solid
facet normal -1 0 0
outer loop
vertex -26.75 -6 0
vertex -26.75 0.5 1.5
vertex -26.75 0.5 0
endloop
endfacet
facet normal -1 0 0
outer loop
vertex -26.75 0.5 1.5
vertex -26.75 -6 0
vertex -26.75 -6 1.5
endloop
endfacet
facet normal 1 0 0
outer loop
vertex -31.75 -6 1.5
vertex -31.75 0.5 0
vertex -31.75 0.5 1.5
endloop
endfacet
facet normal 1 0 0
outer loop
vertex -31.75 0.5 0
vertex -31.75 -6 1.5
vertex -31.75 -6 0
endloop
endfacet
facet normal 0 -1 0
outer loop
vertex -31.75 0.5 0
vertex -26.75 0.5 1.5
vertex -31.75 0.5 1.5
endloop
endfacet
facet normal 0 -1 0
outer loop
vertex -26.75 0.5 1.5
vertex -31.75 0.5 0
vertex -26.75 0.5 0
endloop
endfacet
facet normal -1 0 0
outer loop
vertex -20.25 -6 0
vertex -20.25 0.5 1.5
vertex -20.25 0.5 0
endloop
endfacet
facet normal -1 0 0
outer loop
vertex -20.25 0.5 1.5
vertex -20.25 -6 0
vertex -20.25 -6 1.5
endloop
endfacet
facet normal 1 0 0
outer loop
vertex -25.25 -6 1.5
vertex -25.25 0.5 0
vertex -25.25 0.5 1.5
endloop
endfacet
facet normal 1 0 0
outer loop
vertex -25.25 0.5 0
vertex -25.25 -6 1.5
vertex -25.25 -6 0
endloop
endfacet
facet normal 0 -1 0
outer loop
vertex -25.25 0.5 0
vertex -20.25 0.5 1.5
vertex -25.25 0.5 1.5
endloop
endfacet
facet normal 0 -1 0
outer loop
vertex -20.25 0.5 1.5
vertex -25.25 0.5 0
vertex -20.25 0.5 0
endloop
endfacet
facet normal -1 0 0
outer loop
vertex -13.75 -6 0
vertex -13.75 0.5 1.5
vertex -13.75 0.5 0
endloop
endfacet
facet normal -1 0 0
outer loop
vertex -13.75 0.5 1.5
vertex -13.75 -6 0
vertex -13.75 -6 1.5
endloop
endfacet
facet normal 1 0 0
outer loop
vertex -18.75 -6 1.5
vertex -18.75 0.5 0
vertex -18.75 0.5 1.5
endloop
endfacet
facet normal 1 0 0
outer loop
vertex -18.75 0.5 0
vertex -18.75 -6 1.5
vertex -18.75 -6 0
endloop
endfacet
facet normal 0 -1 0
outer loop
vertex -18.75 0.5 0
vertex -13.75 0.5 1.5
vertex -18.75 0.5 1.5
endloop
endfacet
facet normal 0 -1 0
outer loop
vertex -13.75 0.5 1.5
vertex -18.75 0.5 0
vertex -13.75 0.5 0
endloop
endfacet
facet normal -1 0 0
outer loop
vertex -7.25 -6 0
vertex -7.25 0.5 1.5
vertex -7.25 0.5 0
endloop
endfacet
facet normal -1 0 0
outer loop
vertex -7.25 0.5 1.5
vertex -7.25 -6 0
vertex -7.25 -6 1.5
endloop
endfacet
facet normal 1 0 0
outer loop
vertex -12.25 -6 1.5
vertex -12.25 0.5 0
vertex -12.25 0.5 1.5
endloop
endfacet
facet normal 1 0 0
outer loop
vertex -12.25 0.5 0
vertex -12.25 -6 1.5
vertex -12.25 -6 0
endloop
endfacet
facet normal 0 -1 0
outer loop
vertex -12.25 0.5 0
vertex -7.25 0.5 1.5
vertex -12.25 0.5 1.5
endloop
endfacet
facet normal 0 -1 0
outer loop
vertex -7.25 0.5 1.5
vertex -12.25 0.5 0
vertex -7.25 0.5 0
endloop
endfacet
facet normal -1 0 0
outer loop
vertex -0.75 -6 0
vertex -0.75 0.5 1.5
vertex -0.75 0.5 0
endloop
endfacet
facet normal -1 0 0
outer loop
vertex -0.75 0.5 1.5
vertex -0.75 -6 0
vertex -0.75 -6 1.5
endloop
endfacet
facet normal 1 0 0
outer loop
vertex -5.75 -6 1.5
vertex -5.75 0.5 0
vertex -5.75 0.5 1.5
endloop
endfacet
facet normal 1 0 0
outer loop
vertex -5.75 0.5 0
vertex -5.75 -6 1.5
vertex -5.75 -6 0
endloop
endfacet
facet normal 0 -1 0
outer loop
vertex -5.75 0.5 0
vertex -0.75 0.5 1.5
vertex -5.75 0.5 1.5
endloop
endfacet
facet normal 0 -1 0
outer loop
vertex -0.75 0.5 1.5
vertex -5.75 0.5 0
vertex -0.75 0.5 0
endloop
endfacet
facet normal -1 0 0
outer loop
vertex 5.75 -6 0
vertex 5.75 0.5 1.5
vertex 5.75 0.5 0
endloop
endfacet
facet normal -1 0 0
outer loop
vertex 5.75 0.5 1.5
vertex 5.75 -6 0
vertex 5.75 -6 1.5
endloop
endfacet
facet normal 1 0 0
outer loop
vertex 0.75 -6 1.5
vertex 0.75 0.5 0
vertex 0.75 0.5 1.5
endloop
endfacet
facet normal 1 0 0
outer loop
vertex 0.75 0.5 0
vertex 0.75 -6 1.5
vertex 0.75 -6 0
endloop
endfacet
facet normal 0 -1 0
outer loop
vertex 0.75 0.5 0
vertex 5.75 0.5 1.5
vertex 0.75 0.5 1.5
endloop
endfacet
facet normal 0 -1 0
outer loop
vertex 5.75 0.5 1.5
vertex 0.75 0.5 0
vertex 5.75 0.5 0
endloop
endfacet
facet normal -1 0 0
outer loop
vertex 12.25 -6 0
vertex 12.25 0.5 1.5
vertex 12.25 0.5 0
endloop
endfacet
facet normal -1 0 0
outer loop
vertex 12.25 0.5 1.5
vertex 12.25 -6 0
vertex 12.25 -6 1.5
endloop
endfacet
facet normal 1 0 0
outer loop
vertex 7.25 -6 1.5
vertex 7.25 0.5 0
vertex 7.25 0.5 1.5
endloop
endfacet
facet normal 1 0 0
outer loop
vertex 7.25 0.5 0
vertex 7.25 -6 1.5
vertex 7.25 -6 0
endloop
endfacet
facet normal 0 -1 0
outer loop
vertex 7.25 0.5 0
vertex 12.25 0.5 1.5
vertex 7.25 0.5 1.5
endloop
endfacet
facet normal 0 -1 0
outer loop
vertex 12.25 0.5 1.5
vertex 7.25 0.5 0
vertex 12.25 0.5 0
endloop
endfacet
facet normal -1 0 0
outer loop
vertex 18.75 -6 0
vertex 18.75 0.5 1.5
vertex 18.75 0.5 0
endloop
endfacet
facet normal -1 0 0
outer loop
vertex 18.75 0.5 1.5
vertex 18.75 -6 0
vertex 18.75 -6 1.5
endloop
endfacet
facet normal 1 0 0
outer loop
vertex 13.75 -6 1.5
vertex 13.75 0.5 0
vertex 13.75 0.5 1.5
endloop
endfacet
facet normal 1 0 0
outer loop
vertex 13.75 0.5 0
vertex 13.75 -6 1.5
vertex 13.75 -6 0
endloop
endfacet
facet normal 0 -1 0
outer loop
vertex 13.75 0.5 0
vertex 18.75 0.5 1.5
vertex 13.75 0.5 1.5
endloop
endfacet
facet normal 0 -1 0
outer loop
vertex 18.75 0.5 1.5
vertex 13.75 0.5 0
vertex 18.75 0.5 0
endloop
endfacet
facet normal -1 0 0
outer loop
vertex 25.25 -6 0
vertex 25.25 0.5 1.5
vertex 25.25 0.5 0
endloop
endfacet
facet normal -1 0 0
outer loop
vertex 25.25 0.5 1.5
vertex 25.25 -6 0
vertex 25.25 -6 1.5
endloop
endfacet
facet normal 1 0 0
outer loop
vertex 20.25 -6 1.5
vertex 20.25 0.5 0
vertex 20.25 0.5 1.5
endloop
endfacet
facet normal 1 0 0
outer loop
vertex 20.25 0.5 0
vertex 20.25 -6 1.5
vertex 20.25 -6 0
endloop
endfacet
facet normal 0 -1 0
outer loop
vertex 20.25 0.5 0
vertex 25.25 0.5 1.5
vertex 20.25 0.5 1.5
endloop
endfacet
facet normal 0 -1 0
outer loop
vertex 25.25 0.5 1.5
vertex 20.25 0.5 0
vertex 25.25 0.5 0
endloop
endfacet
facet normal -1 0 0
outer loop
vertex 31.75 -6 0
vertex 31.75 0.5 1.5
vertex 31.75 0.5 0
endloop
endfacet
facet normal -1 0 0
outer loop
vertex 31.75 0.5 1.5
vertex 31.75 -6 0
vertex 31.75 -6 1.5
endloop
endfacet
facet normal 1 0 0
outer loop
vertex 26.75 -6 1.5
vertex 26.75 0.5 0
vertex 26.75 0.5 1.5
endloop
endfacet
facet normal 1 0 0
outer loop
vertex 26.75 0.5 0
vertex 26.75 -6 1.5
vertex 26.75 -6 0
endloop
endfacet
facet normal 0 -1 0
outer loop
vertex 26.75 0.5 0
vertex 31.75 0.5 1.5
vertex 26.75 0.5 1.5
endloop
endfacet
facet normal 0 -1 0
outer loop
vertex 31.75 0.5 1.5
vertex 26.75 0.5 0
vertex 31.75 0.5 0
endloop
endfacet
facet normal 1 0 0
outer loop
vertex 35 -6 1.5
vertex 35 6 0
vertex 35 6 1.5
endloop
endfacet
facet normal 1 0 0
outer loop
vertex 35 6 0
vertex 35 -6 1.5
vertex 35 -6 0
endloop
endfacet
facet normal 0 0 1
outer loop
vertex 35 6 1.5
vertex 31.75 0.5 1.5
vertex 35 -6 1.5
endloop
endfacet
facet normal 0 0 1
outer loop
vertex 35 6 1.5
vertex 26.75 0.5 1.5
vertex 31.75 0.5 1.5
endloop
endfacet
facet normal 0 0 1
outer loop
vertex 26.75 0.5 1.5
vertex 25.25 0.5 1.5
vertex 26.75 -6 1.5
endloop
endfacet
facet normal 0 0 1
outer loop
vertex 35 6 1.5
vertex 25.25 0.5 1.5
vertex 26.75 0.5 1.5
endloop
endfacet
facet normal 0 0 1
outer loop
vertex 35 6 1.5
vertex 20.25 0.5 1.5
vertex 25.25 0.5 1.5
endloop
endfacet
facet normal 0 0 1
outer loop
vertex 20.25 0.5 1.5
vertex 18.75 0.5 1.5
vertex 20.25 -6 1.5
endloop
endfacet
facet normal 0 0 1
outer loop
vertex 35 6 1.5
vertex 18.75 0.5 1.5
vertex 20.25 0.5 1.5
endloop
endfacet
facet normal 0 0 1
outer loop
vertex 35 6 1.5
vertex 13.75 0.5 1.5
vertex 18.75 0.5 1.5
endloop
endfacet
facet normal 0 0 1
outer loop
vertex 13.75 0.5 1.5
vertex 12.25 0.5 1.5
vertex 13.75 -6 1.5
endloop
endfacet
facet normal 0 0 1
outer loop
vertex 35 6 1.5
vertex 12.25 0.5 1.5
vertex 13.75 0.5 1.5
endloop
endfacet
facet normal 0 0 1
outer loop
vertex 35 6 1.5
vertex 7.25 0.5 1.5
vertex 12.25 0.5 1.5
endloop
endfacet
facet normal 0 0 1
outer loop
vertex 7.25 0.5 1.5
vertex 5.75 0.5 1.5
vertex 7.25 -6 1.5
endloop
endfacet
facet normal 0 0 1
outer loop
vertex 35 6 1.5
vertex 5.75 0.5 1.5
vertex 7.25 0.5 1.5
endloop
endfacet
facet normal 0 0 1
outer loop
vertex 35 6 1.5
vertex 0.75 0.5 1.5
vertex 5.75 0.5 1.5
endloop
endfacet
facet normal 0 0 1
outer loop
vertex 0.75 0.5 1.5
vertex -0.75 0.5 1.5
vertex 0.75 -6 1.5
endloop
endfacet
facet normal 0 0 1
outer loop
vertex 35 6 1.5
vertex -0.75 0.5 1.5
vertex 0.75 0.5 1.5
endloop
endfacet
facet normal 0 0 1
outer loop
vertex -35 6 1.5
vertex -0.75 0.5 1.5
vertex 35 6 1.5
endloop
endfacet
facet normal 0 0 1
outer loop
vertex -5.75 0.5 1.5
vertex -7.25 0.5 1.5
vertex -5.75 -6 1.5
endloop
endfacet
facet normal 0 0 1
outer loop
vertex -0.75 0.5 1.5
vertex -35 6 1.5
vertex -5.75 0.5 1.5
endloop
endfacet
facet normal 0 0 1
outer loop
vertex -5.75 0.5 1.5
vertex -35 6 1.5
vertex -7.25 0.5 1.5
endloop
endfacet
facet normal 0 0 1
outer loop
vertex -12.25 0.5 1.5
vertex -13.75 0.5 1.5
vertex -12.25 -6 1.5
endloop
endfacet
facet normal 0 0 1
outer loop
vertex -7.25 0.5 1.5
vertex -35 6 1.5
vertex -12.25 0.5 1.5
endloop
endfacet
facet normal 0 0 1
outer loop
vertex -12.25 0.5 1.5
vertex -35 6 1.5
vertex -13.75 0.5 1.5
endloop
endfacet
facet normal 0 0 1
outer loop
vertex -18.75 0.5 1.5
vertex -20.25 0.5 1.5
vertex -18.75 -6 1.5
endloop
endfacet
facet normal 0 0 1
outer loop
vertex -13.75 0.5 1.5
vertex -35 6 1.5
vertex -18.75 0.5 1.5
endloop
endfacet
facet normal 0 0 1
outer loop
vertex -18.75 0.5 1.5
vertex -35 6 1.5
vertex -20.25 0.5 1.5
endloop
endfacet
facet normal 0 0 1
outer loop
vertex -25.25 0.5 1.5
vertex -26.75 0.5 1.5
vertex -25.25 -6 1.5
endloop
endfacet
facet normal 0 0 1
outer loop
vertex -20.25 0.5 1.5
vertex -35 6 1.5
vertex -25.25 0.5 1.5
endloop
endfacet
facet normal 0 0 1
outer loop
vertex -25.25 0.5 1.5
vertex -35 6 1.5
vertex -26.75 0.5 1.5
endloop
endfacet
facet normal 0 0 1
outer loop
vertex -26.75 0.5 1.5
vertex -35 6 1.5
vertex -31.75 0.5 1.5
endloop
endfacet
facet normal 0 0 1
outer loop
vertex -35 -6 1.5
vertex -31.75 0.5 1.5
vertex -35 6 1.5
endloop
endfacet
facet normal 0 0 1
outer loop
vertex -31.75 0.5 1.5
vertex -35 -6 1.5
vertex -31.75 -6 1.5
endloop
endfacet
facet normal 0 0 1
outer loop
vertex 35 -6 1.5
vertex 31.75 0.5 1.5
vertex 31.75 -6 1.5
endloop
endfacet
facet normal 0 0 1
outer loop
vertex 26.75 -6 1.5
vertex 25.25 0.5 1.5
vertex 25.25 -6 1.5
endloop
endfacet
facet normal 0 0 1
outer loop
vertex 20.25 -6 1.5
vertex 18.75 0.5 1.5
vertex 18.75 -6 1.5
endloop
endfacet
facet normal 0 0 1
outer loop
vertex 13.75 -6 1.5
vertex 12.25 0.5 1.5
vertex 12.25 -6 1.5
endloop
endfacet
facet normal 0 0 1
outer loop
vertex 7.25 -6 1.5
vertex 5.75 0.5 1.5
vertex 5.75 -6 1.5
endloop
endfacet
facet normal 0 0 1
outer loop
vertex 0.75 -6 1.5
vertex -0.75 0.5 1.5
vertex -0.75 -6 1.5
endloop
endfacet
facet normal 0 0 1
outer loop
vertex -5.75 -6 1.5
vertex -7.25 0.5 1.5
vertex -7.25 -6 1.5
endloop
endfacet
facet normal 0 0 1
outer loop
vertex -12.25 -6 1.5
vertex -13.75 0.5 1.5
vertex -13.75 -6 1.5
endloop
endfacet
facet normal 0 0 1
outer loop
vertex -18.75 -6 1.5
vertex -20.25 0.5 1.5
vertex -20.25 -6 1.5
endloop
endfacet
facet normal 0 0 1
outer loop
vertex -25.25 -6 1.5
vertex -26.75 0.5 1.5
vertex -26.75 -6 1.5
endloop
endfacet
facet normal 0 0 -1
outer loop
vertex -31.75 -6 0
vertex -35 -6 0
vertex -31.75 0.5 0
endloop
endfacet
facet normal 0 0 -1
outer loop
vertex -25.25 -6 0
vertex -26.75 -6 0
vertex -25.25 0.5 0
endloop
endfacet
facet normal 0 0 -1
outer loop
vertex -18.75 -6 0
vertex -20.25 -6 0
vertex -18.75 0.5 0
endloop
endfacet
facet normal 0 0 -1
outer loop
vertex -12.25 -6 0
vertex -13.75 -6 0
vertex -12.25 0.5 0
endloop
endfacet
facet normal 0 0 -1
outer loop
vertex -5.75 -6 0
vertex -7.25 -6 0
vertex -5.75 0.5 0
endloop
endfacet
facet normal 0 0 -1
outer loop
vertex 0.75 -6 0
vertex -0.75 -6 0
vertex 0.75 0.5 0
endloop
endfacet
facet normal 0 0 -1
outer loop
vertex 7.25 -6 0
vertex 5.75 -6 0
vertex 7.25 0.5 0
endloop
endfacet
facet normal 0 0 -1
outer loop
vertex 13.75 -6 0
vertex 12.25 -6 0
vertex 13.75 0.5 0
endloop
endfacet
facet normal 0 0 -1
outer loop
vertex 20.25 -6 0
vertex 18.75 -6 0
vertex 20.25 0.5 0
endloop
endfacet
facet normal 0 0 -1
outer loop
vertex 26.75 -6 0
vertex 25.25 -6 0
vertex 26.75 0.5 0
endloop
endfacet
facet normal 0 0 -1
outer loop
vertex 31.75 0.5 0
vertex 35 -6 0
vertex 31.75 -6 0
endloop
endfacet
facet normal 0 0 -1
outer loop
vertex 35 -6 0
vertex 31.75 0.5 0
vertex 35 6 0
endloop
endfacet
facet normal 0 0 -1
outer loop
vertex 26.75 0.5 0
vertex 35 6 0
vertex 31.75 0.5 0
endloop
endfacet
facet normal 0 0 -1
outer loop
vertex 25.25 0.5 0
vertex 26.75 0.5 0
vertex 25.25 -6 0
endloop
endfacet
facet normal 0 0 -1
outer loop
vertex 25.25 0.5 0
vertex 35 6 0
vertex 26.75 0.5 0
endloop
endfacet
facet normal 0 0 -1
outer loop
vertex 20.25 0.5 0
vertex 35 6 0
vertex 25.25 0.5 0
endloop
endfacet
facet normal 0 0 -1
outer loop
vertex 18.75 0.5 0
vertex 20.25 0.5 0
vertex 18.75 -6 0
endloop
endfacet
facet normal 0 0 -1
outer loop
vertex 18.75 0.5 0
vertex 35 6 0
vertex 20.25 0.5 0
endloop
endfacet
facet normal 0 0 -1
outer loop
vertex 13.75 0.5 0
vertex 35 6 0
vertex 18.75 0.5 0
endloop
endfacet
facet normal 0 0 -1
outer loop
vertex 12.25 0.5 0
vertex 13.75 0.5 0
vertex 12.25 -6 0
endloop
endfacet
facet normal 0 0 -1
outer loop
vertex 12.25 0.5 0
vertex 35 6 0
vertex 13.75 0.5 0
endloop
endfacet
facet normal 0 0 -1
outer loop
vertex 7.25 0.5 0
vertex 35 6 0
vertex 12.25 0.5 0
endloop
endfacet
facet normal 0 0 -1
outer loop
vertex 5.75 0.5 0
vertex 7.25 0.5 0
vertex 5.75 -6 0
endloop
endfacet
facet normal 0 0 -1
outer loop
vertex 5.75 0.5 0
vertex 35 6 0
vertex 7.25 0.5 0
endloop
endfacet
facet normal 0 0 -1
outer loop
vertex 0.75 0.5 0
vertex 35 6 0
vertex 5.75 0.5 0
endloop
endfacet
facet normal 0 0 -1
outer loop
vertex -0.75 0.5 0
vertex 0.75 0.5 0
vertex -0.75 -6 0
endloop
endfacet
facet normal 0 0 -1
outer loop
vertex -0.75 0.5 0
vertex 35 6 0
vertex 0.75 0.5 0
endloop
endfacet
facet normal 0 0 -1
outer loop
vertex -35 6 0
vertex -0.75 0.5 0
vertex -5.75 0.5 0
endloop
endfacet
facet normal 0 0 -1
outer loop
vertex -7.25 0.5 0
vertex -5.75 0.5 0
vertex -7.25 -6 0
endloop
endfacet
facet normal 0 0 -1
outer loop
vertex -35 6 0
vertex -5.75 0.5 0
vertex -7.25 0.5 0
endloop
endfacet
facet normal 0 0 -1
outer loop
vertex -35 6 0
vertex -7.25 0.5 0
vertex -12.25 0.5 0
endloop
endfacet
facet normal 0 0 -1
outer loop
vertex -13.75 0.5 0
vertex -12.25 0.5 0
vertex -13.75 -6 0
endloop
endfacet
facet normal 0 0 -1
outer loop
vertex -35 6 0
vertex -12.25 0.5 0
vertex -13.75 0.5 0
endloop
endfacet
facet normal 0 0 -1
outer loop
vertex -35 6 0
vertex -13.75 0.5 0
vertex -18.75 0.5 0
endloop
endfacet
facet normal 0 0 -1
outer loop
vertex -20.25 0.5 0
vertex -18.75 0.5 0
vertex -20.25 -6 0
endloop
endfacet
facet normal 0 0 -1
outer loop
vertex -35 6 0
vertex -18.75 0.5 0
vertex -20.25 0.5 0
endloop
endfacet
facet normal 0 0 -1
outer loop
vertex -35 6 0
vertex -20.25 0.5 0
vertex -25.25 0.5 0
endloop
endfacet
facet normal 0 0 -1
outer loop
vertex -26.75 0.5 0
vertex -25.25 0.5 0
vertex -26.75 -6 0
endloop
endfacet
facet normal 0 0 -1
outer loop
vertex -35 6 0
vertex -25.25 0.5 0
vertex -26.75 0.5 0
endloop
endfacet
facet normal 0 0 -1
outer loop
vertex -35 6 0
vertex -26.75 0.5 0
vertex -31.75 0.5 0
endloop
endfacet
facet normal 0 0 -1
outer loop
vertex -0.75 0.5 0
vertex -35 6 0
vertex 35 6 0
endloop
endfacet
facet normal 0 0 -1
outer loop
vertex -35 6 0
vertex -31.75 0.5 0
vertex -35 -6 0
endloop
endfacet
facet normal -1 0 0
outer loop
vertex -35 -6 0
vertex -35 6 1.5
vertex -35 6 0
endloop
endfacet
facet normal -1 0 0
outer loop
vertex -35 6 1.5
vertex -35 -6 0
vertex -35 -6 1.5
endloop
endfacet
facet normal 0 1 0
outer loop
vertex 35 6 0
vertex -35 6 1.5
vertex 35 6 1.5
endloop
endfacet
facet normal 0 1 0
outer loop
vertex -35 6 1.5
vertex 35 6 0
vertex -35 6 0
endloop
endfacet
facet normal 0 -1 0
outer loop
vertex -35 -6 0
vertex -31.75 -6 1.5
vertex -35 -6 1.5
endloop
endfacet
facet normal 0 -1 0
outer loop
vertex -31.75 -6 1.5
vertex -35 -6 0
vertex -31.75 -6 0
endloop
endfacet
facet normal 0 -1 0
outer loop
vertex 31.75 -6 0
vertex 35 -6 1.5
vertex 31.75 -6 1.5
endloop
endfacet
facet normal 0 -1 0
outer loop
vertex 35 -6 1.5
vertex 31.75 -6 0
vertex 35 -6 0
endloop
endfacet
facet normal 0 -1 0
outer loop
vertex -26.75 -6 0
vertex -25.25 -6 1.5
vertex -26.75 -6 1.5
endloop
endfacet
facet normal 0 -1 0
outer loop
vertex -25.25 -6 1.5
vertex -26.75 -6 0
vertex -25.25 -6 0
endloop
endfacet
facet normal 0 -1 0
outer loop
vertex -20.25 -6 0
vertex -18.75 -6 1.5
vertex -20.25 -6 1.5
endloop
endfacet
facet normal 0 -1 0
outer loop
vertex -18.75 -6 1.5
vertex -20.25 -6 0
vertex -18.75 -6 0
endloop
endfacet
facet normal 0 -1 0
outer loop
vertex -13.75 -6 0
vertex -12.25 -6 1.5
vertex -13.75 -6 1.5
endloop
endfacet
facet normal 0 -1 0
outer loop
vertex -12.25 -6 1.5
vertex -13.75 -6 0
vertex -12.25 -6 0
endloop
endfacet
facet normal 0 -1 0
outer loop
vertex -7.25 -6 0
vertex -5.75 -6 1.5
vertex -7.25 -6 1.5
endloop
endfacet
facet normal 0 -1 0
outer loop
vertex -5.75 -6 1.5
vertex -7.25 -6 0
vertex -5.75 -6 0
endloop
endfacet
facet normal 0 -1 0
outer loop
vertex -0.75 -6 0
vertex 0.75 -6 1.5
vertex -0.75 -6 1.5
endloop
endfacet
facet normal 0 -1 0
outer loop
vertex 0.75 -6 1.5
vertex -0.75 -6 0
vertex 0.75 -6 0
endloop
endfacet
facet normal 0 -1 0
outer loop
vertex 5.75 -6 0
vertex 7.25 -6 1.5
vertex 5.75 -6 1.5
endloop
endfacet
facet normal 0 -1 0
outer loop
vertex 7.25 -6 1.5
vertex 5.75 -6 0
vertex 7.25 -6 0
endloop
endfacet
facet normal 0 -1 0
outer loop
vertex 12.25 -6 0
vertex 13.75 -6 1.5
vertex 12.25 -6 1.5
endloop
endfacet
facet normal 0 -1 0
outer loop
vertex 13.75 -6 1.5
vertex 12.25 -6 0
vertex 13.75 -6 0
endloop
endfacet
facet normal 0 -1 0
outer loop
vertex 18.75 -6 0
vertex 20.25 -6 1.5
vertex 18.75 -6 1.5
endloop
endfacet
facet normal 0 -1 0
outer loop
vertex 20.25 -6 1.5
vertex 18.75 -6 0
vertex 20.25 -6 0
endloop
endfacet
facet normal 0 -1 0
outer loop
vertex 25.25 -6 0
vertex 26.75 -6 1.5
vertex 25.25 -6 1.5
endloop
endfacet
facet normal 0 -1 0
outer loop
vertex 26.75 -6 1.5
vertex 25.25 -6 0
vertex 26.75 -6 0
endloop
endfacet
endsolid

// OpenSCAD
// 10-well agarose gel comb, printed lying flat
// Units: mm

plate_t      = 1.5;   // plate thickness (Z)
spine_len    = 70;    // spine length (X)
spine_w      = 12;    // spine width (Y)
teeth_n      = 10;    // number of teeth
teeth_w      = 5;     // tooth width (X)
teeth_l      = 12;    // tooth length (Y)
teeth_gap    = 1.5;   // gap between teeth (X)
overcut      = 0.5;   // cutter overshoot past faces

$fn = 64;

pitch = teeth_w + teeth_gap;   // centre-to-centre spacing
x0    = -(teeth_n - 1) * pitch / 2;  // first tooth centre

difference() {
    // Spine
    translate([-spine_len / 2, -spine_w / 2, 0])
        cube([spine_len, spine_w, plate_t]);

    // Teeth
    for (i = [0 : teeth_n - 1])
        translate([x0 + i * pitch - teeth_w / 2, -teeth_l, -overcut])
            cube([teeth_w, teeth_l + overcut, plate_t + 2 * overcut]);
}
